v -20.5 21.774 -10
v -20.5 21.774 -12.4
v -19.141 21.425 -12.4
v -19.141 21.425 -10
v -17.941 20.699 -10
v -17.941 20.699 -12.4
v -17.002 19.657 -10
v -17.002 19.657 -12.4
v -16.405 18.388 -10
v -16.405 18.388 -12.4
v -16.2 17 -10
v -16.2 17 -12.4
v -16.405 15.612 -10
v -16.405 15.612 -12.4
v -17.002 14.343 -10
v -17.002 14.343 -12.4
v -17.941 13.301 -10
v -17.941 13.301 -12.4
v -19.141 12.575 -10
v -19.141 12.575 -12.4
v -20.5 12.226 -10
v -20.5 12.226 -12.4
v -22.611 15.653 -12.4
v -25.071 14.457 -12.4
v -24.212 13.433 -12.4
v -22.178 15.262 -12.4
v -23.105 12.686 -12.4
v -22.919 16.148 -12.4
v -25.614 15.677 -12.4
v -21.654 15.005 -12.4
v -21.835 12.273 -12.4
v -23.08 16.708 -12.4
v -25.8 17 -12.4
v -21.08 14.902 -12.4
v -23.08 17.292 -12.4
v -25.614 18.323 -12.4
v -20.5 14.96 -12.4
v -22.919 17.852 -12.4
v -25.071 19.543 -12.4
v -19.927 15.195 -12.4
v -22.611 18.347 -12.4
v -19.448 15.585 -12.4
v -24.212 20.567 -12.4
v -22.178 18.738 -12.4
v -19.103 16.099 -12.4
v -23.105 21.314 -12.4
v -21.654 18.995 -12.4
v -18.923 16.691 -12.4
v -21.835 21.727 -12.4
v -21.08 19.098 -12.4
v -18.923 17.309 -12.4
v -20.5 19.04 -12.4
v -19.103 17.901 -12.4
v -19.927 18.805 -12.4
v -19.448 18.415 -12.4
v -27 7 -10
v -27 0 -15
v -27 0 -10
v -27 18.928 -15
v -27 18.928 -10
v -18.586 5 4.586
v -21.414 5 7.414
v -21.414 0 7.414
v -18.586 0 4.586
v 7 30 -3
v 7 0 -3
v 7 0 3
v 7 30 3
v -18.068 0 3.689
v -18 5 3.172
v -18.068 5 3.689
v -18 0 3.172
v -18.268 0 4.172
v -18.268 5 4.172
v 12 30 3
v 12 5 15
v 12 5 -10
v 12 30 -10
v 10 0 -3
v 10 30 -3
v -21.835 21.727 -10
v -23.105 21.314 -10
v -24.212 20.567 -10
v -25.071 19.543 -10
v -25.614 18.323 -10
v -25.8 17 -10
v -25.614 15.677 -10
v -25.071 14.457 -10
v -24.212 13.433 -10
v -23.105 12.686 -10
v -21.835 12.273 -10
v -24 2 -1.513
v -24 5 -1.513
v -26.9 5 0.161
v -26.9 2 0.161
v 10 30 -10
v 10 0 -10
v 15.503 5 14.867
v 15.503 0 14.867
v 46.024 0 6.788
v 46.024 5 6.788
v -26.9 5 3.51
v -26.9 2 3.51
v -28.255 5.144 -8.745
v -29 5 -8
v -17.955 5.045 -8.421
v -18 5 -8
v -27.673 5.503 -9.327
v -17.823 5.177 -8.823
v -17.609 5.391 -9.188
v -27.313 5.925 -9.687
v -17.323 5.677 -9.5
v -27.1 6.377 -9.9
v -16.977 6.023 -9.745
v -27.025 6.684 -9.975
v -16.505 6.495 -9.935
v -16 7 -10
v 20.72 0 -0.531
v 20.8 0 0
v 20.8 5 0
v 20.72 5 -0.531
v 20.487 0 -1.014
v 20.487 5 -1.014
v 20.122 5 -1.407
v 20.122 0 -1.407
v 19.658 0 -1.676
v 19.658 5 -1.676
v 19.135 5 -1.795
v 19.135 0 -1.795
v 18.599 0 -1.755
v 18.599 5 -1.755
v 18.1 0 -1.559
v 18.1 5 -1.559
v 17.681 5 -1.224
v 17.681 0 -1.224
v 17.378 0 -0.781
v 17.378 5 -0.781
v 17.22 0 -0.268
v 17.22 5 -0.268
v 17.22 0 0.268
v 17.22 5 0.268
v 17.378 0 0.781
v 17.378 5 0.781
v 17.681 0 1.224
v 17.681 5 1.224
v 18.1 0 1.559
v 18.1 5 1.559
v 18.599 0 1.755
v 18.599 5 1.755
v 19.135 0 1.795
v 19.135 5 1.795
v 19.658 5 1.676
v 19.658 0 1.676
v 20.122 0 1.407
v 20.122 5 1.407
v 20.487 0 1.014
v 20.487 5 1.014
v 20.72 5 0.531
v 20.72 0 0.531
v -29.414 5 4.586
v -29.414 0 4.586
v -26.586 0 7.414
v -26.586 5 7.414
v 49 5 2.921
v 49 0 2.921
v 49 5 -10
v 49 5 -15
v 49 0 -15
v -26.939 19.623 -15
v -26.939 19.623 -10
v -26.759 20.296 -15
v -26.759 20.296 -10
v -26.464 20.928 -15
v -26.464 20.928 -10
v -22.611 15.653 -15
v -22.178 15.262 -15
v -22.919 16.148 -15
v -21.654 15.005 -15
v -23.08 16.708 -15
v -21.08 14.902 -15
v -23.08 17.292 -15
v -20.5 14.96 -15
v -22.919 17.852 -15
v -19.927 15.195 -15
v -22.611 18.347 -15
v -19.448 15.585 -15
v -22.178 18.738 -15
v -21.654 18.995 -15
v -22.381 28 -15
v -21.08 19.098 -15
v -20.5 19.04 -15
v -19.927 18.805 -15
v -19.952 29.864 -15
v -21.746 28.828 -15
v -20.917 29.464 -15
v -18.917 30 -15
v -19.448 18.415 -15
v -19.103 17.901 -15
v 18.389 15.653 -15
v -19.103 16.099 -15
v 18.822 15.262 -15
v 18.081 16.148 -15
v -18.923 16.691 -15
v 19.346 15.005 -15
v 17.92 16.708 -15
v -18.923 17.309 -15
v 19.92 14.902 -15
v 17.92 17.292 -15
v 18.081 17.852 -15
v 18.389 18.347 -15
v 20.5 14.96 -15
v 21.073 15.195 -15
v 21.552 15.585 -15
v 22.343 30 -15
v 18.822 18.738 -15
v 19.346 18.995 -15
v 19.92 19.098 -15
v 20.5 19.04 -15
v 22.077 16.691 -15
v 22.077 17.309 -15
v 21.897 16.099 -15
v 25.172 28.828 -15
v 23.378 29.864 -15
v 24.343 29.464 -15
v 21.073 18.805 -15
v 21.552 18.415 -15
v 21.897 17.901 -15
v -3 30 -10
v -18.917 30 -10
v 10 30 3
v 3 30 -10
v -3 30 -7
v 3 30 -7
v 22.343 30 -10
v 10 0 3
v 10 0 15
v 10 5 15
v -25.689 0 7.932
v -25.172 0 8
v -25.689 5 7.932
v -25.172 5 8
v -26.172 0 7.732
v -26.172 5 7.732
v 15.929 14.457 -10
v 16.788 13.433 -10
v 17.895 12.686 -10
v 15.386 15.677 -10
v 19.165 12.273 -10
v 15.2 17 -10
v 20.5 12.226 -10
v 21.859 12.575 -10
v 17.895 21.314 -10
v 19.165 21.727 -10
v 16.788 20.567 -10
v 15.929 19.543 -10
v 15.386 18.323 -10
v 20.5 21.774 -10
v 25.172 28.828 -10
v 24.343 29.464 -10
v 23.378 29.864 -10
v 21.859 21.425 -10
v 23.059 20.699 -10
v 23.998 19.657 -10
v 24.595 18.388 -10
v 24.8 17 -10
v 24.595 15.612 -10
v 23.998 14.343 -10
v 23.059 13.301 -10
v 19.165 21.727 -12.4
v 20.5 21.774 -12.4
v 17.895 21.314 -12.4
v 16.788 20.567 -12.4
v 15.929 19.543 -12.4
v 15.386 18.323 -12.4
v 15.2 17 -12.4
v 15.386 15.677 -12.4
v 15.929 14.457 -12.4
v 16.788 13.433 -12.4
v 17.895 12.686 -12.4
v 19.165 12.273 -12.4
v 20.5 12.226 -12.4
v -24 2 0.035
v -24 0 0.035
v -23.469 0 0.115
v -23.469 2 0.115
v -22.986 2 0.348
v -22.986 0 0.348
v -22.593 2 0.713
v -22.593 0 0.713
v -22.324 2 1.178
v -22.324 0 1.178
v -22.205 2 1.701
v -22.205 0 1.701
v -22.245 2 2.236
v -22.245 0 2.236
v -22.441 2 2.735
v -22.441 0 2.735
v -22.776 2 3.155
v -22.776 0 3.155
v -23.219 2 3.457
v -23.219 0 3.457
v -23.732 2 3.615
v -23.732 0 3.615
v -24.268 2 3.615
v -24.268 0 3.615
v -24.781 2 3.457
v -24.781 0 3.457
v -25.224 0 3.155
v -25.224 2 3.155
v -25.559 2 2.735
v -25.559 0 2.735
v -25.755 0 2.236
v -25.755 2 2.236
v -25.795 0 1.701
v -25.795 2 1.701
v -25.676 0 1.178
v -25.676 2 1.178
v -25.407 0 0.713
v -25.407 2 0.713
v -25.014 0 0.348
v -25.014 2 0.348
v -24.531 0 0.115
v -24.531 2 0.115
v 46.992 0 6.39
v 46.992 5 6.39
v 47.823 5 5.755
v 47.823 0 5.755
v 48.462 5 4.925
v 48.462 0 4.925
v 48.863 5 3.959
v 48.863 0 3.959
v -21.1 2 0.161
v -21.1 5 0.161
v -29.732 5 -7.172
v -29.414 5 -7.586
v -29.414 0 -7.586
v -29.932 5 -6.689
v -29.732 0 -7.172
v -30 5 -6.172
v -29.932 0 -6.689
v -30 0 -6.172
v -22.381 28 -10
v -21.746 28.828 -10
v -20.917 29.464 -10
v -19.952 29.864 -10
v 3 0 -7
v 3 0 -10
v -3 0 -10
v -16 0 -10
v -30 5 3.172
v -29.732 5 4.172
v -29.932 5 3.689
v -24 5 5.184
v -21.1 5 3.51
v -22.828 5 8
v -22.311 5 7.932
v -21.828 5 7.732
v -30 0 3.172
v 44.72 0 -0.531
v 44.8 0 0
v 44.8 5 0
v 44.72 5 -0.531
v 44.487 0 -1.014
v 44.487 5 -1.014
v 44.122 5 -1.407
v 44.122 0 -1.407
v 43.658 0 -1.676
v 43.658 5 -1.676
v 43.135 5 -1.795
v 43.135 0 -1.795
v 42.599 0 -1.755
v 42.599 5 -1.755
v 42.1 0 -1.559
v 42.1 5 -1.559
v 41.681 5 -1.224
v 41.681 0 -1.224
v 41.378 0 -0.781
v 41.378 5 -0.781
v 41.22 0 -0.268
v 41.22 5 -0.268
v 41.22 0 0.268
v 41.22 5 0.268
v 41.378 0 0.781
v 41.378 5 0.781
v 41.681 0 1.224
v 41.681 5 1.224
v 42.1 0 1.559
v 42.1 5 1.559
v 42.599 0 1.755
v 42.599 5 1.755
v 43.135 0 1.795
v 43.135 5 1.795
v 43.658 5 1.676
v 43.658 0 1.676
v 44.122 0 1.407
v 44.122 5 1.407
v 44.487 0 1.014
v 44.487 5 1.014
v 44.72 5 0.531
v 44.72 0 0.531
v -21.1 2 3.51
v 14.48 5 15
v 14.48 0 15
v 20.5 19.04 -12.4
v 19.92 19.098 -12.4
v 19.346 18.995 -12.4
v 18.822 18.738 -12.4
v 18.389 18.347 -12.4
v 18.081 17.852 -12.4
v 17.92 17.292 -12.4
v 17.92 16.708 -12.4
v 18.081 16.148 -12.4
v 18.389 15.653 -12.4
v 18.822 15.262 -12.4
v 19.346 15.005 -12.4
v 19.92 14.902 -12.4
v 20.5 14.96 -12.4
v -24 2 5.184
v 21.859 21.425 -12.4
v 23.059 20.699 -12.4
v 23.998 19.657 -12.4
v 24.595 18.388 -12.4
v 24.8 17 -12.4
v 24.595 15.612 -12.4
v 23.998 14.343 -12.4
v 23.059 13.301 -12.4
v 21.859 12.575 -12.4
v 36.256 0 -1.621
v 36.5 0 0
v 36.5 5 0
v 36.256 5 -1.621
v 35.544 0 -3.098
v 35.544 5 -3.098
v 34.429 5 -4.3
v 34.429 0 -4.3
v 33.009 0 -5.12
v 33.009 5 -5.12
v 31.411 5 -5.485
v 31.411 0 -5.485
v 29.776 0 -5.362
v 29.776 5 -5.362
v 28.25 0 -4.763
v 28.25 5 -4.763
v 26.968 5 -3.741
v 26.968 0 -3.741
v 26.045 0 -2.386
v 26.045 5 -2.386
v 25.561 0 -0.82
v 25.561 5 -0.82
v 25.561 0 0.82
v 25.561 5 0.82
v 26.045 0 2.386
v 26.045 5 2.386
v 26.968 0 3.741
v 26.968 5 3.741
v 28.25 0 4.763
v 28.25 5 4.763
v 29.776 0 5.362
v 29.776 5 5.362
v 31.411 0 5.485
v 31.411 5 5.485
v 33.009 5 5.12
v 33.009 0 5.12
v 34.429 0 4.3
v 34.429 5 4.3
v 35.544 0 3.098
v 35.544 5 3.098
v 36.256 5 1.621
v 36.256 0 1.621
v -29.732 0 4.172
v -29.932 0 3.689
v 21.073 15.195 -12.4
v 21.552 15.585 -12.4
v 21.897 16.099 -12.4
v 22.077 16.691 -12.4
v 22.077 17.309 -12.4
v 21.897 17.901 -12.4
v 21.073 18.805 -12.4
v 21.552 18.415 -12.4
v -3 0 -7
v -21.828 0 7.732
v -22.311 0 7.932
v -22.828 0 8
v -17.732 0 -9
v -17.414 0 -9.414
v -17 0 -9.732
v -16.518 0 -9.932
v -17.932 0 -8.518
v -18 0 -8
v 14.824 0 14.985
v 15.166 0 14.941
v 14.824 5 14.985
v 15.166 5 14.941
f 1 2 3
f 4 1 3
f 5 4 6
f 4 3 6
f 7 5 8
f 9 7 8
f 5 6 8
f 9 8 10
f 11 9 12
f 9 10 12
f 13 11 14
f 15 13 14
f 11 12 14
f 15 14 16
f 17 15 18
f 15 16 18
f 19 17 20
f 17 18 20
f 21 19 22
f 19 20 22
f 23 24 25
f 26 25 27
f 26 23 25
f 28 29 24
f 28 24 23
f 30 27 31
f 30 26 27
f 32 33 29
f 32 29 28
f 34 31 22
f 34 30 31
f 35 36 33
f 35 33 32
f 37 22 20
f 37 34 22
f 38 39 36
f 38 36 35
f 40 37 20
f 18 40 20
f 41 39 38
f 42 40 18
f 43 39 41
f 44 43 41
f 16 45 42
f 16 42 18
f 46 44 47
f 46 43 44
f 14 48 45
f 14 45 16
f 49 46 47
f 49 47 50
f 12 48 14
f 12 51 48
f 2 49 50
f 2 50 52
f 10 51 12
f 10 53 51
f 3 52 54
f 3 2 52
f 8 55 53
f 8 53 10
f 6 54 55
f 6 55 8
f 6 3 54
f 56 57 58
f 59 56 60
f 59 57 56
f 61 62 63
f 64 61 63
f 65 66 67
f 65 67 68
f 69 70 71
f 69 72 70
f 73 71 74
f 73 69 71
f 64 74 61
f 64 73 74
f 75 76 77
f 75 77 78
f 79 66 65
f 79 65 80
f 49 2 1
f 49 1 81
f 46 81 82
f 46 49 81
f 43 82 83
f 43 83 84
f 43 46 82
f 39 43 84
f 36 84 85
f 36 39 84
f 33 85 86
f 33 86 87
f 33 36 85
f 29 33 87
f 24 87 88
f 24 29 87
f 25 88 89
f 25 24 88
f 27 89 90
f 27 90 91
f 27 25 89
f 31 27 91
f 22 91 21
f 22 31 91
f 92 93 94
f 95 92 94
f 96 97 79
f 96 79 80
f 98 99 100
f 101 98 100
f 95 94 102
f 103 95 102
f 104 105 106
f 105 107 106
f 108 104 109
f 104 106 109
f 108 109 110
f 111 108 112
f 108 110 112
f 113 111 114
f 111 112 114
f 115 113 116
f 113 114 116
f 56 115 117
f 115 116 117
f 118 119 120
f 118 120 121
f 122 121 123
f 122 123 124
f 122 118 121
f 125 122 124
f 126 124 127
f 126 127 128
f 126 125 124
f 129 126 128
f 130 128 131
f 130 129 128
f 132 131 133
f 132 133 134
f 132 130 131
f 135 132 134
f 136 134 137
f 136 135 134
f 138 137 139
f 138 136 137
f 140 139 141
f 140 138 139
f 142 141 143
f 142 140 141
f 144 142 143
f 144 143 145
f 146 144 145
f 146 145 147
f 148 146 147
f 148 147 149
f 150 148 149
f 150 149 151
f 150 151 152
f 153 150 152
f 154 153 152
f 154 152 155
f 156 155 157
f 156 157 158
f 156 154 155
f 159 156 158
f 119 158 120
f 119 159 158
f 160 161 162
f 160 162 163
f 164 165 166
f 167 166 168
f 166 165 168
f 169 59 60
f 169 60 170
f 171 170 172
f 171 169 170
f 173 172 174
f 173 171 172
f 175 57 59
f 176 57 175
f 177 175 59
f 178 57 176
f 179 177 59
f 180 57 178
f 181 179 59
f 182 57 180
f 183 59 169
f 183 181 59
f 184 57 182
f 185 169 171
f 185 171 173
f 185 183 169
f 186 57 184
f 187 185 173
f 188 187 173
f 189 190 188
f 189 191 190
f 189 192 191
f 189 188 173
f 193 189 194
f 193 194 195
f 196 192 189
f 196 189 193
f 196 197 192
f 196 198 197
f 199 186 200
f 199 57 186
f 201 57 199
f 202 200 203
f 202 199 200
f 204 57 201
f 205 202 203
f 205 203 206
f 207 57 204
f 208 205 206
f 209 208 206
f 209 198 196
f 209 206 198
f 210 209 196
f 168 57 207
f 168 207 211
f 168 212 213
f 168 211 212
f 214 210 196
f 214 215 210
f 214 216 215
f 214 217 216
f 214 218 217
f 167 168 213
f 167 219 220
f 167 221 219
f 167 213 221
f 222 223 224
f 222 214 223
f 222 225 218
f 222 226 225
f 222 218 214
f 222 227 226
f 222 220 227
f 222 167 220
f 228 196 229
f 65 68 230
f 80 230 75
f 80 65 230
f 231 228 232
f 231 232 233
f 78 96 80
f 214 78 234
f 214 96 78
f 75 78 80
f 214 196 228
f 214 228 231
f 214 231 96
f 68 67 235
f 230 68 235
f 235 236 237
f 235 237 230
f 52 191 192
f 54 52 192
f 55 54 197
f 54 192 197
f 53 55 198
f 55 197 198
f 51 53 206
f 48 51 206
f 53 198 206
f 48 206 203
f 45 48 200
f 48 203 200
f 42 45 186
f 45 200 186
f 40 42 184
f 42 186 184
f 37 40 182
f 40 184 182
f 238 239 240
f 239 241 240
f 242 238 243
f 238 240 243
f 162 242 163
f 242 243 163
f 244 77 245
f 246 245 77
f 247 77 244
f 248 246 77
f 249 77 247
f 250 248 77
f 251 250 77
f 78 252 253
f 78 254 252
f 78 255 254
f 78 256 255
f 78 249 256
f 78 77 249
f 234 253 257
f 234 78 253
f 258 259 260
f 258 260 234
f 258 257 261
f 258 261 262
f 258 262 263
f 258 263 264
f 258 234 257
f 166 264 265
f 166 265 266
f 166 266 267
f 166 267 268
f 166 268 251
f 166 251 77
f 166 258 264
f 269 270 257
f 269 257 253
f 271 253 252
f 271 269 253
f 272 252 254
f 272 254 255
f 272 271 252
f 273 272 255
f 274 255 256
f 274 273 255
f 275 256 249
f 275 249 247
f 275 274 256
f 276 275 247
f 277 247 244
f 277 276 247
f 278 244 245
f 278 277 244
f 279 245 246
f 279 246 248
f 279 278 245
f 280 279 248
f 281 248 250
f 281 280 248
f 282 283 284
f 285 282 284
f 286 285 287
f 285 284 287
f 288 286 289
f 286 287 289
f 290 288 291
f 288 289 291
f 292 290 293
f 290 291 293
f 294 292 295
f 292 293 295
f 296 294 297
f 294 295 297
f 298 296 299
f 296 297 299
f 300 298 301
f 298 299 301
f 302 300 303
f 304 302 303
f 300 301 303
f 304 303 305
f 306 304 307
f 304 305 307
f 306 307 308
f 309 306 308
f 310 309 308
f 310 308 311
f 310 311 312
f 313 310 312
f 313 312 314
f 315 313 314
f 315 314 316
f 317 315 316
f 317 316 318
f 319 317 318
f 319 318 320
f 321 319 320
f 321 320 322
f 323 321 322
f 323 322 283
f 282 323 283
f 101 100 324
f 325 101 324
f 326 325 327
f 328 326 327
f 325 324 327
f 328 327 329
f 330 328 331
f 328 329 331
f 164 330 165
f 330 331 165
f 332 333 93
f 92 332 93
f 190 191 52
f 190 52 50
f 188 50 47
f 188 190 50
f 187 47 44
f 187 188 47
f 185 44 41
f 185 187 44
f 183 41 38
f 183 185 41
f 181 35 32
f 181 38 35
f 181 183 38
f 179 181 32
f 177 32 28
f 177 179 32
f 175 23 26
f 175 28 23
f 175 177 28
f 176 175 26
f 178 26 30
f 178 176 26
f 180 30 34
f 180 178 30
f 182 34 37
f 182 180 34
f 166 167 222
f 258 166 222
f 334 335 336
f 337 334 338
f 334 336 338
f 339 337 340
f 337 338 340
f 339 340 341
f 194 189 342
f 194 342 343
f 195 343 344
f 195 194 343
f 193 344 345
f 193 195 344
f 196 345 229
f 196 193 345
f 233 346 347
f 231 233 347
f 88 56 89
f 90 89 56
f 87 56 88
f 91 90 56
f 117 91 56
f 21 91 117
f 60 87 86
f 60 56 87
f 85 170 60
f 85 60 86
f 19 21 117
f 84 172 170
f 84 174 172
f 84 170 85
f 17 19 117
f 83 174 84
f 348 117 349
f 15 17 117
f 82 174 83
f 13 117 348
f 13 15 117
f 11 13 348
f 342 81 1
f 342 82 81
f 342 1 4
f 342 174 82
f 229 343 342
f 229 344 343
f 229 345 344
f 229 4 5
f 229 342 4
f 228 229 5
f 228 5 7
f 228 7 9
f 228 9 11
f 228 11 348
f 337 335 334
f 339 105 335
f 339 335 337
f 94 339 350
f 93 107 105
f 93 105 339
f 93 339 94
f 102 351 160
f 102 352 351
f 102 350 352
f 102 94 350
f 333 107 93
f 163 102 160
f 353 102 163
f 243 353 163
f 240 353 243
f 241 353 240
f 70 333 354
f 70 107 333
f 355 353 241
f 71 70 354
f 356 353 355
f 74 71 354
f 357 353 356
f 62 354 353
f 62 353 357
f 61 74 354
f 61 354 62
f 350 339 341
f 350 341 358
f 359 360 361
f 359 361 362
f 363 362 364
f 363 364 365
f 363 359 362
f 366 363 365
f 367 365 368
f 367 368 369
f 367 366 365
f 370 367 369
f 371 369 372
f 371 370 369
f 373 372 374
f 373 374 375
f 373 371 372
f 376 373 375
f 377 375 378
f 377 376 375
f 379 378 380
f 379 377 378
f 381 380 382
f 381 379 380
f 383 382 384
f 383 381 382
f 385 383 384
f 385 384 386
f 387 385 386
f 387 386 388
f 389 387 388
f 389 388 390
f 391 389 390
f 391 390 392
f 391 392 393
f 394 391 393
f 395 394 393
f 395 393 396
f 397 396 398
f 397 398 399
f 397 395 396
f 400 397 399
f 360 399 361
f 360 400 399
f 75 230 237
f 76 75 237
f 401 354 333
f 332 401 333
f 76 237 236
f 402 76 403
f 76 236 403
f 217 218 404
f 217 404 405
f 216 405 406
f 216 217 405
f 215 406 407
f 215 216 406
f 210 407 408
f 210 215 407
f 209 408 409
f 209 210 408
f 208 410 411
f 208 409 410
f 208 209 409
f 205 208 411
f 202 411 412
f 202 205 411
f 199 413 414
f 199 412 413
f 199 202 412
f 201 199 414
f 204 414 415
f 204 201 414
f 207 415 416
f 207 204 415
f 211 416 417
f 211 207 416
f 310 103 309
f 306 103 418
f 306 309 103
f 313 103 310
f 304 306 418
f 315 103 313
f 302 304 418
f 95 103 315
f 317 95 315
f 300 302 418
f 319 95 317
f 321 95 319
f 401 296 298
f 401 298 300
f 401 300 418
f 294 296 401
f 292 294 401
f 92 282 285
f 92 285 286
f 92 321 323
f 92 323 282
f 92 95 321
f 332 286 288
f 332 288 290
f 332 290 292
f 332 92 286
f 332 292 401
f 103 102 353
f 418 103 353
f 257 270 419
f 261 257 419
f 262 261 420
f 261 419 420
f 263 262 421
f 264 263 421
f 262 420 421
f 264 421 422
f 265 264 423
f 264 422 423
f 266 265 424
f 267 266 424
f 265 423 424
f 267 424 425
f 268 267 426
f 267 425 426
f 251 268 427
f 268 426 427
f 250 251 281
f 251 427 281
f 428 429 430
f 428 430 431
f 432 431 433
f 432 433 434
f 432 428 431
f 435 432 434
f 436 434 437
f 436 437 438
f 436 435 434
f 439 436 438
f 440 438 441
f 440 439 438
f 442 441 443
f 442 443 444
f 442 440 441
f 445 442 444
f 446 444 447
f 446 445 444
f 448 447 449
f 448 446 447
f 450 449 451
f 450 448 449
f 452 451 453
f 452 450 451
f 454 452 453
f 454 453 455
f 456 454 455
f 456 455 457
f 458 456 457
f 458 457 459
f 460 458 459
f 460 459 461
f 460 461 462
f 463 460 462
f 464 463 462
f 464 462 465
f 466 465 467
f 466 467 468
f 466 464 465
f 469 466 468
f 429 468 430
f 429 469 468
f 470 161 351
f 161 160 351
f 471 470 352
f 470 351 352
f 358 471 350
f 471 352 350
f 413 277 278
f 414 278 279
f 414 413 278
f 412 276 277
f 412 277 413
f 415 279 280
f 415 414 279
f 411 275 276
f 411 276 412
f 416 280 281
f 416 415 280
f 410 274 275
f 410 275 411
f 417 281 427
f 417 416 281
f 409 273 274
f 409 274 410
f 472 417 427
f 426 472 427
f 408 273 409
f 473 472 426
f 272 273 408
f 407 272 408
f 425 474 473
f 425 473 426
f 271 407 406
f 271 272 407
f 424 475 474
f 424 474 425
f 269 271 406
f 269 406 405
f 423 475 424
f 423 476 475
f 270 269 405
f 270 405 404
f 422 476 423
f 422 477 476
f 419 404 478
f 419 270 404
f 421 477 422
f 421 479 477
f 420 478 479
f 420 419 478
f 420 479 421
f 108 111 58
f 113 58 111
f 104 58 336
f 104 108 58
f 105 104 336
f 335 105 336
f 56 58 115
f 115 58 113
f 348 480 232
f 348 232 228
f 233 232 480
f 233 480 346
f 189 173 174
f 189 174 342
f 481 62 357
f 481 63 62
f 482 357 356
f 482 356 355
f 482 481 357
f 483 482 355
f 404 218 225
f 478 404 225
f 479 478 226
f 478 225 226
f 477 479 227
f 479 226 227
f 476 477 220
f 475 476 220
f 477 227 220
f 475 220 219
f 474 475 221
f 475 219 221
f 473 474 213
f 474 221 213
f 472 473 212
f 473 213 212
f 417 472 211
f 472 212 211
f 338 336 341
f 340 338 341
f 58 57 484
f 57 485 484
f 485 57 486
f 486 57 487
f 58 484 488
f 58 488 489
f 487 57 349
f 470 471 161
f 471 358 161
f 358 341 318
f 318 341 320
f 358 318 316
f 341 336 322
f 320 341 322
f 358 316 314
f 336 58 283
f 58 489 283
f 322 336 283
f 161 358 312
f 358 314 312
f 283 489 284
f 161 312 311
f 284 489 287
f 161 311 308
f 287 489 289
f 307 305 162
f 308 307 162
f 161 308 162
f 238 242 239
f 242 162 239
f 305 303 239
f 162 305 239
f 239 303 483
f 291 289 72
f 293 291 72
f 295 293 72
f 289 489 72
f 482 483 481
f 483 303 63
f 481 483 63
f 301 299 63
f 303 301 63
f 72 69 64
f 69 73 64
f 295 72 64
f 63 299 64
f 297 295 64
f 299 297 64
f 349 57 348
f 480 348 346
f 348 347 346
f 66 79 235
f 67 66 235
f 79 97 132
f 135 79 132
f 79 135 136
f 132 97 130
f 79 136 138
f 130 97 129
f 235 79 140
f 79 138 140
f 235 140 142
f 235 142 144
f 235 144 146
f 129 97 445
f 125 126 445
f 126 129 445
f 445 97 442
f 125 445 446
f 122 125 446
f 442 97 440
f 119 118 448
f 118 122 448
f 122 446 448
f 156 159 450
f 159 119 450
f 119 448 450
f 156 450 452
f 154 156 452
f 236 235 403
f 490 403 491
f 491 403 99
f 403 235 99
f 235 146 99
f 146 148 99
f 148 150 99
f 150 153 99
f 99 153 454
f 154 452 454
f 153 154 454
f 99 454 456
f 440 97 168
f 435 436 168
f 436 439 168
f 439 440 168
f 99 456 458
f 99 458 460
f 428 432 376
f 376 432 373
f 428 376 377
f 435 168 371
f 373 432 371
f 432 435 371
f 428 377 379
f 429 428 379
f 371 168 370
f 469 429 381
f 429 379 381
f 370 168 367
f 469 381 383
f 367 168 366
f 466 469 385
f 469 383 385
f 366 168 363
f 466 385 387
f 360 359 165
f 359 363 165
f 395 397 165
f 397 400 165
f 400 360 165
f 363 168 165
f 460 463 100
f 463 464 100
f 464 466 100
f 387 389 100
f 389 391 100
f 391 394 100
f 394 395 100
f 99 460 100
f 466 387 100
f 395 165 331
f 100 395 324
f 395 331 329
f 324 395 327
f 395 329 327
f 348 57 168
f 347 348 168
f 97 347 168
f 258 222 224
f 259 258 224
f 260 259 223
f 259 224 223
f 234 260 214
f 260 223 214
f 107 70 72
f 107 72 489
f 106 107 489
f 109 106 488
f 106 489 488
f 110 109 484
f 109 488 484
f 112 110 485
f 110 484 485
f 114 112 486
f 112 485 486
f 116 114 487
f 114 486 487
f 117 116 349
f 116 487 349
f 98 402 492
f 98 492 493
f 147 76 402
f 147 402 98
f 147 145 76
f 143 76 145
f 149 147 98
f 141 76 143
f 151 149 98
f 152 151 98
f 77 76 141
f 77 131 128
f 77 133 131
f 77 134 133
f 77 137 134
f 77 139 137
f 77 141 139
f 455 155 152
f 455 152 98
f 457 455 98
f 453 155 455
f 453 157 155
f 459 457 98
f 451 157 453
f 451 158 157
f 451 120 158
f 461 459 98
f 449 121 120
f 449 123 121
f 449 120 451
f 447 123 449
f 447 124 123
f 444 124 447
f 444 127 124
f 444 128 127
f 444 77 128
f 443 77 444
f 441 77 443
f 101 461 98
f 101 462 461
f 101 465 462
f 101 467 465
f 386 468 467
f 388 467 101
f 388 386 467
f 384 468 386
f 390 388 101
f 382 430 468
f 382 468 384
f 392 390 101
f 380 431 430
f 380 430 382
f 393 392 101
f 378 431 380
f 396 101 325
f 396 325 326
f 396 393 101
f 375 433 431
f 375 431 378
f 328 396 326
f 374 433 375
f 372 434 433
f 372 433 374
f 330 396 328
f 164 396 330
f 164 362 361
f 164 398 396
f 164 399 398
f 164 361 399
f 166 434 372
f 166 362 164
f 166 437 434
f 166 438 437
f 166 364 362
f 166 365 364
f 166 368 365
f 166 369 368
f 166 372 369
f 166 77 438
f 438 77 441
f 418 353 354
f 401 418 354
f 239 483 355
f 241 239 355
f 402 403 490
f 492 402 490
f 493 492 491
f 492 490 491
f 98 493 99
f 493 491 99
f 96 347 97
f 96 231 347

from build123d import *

# Parameters (mm, degrees)
SKETCH1_W                     = 30
SKETCH1_H                     = 30
BOSS_EXTRUDE1_DEPTH           = 30
SKETCH2_W                     = 20
SKETCH2_H                     = 20
CUT_EXTRUDE1_DEPTH            = 37.742346142
SKETCH3_W                     = 30
SKETCH3_H                     = 5
BOSS_EXTRUDE2_DEPTH           = 40
SKETCH4_R                     = 5.5
SKETCH4_R_2                   = 1.8
CUT_EXTRUDE2_DEPTH            = 65.420493634
CUT_EXTRUDE3_DEPTH            = 63.24949799
SKETCH5_W                     = 5
SKETCH5_H                     = 25
BOSS_EXTRUDE4_DEPTH           = 34
CHAMFER1_SIZE                 = 25
SKETCH8_R                     = 2.1
CUT_EXTRUDE4_DEPTH            = 63.657800791
SKETCH9_W                     = 5
SKETCH9_H                     = 30
BOSS_EXTRUDE5_DEPTH           = 12
CHAMFER2_SIZE                 = 10
CHAMFER2_SIZE2                = 5.773502692
SKETCH10_R                    = 2.1
CUT_EXTRUDE5_DEPTH            = 63.657800791
BODY_MOVE_COPY1_OUTLINE_R     = 1.8
BODY_MOVE_COPY1_OUTLINE_R_2   = 5.5
BODY_MOVE_COPY1_DEPTH         = 27.5685
BODY_MOVE_COPY1_2_OUTLINE_R   = 1.8
BODY_MOVE_COPY1_2_OUTLINE_R_2 = 5.5
BODY_MOVE_COPY1_2_DEPTH       = 5
BODY_MOVE_COPY1_START         = -15
BODY_MOVE_COPY1_3_DEPTH       = 5
BODY_MOVE_COPY1_4_DEPTH       = 5
SKETCH11_W                    = 3
SKETCH11_H                    = 25
CUT_EXTRUDE6_DEPTH            = 25
SKETCH12_W                    = 25
SKETCH12_H                    = 25
CUT_EXTRUDE7_DEPTH            = 60.380131357
SKETCH13_W                    = 3
SKETCH13_H                    = 6
SKETCH13_W_2                  = 6
SKETCH13_H_2                  = 3
BOSS_EXTRUDE6_DEPTH           = 30
SKETCH14_R                    = 4.8
CUT_EXTRUDE9_DEPTH            = 2.4
CHAMFER3_SIZE                 = 12
CHAMFER3_SIZE2                = 25
FILLET1_R                     = 4
FILLET2_R                     = 4
BODY_MOVE_COPY2_OUTLINE_R     = 1.8
BODY_MOVE_COPY2_OUTLINE_R_2   = 5.5
BODY_MOVE_COPY2_DEPTH         = 30
BODY_MOVE_COPY2_2_OUTLINE_R   = 1.8
BODY_MOVE_COPY2_2_OUTLINE_R_2 = 5.5
BODY_MOVE_COPY2_2_DEPTH       = 5
BODY_MOVE_COPY2_START         = -15
BODY_MOVE_COPY2_3_DEPTH       = 5
BODY_MOVE_COPY2_START_2       = -3
BODY_MOVE_COPY2_4_OUTLINE_W   = 5
BODY_MOVE_COPY2_4_OUTLINE_H   = 25
BODY_MOVE_COPY2_4_DEPTH       = 6
BODY_MOVE_COPY2_START_3       = -10
BODY_MOVE_COPY2_5_OUTLINE_W   = 2
BODY_MOVE_COPY2_5_OUTLINE_H   = 25
BODY_MOVE_COPY2_5_DEPTH       = 13
BODY_MOVE_COPY2_6_DEPTH       = 2.6
BODY_MOVE_COPY2_START_4       = 10
BODY_MOVE_COPY2_7_DEPTH       = 2
BODY_MOVE_COPY2_START_5       = 7
BODY_MOVE_COPY2_8_OUTLINE_W   = 25
BODY_MOVE_COPY2_8_OUTLINE_H   = 6
BODY_MOVE_COPY2_8_DEPTH       = 3.26576
BODY_MOVE_COPY2_START_6       = -16
BODY_MOVE_COPY2_9_DEPTH       = 6
BODY_MOVE_COPY2_START_7       = -12.4
BODY_MOVE_COPY2_10_DEPTH      = 2.4
SKETCH15_W                    = 13
SKETCH15_H                    = 5
BOSS_EXTRUDE7_DEPTH           = 18
SKETCH17_W                    = 23
SKETCH17_H                    = 5
BOSS_EXTRUDE8_DEPTH           = 3
SKETCH18_W                    = 4
SKETCH18_H                    = 18
CUT_EXTRUDE10_DEPTH           = 58.017541161
CHAMFER6_SIZE                 = 4
FILLET4_R                     = 2
SKETCH16_R                    = 1.8
CUT_EXTRUDE11_DEPTH           = 60.380131357
CUT_EXTRUDE12_DEPTH           = 3


with BuildPart() as part:
    # Sketch1 → Boss-Extrude1 (new body)
    with BuildSketch(Plane(origin=(0, 0, 0), x_dir=(1, 0, 0), z_dir=(0, 1, 0))):
        Rectangle(SKETCH1_W, SKETCH1_H)
    extrude(amount=BOSS_EXTRUDE1_DEPTH)

    # Sketch2 → Cut-Extrude1 (cut, through all)
    with BuildSketch(Plane(origin=(0, 30, 0), x_dir=(1, 0, 0), z_dir=(0, 1, 0))):
        Rectangle(SKETCH2_W, SKETCH2_H)
    extrude(amount=-CUT_EXTRUDE1_DEPTH, mode=Mode.SUBTRACT)

    # Sketch3 → Boss-Extrude2 (add)
    with BuildSketch(Plane(origin=(15, 0, 0), x_dir=(0, 0, -1), z_dir=(1, 0, 0))):
        with Locations((0, 2.5)):
            Rectangle(SKETCH3_W, SKETCH3_H)
    extrude(amount=BOSS_EXTRUDE2_DEPTH)

    # Sketch4 → Cut-Extrude2 (cut, through all)
    with BuildSketch(Plane.XZ):
        with Locations(Location((31, 0, 0), (0, 0, 270))):
            Circle(SKETCH4_R)
        with Locations(Location((19, 0, 0), (0, 0, 270))):
            Circle(SKETCH4_R_2)
        with Locations(Location((43, 0, 0), (0, 0, 270))):
            Circle(SKETCH4_R_2)
    extrude(amount=-CUT_EXTRUDE2_DEPTH, mode=Mode.SUBTRACT)

    # Sketch7 → Cut-Extrude3 (cut, through all)
    with BuildSketch(Plane(origin=(0, 5, 0), x_dir=(1, 0, 0), z_dir=(0, 1, 0))):
        Polygon((15, -15), (49, -6), (49, 15), (55, 15), (55, -15), align=None)
    extrude(amount=-CUT_EXTRUDE3_DEPTH, mode=Mode.SUBTRACT)

    # Sketch5 → Boss-Extrude4 (add)
    with BuildSketch(Plane(origin=(15, 0, 0), x_dir=(0, 0, -1), z_dir=(1, 0, 0))):
        with Locations((12.5, 17.5)):
            Rectangle(SKETCH5_W, SKETCH5_H)
    extrude(amount=BOSS_EXTRUDE4_DEPTH)

    # Chamfer1
    chamfer1_edges = [part.edges().sort_by_distance(p)[0] for p in [
        (49, 30, -12.5),
    ]]
    chamfer(chamfer1_edges, length=CHAMFER1_SIZE)

    # Sketch8 → Cut-Extrude4 (cut, through all)
    with BuildSketch(Plane.XY.offset(-10)):
        with Locations((20, 17)):
            Circle(SKETCH8_R)
    extrude(amount=-CUT_EXTRUDE4_DEPTH, mode=Mode.SUBTRACT)

    # Sketch9 → Boss-Extrude5 (add)
    with BuildSketch(Plane.ZY.offset(15)):
        with Locations((-12.5, 15)):
            Rectangle(SKETCH9_W, SKETCH9_H)
    extrude(amount=BOSS_EXTRUDE5_DEPTH)

    # Chamfer2
    chamfer2_edges = [part.edges().sort_by_distance(p)[0] for p in [
        (-27, 30, -12.5),
    ]]
    chamfer2_side = [part.faces().sort_by_distance(p)[0] for p in [
        (-27, 15, -12.5),
    ]]
    chamfer(chamfer2_edges, length=CHAMFER2_SIZE, length2=CHAMFER2_SIZE2, reference=chamfer2_side[0])

    # Sketch10 → Cut-Extrude5 (cut, through all)
    with BuildSketch(Plane.XY.offset(-10)):
        with Locations((-21, 17)):
            Circle(SKETCH10_R)
    extrude(amount=-CUT_EXTRUDE5_DEPTH, mode=Mode.SUBTRACT)

    # Body-Move/Copy1: read off the stored shape, not the designer's step
    # Body-Move/Copy1 outline → Body-Move/Copy1 (cut)
    with BuildSketch(Plane(origin=(0, 0, 0), x_dir=(1, 0, 0), z_dir=(0, 1, 0))):
        Polygon((27, 10), (15, 10), (15, -15), (49, -6), (49, 15), (27, 15), align=None)
        with Locations((19, 0)):
            Circle(BODY_MOVE_COPY1_OUTLINE_R, mode=Mode.SUBTRACT)
        with Locations((31, 0)):
            Circle(BODY_MOVE_COPY1_OUTLINE_R_2, mode=Mode.SUBTRACT)
        with Locations((43, 0)):
            Circle(BODY_MOVE_COPY1_OUTLINE_R, mode=Mode.SUBTRACT)
    extrude(amount=BODY_MOVE_COPY1_DEPTH, mode=Mode.SUBTRACT)

    # Body-Move_Copy1 2 outline → Body-Move_Copy1 2 (add)
    with BuildSketch(Plane(origin=(0, 0, 0), x_dir=(1, 0, 0), z_dir=(0, 1, 0))):
        Polygon((-27, 10), (-27, 15), (-49, 15), (-49, -6), (-15, -15), (-15, 10), align=None)
        with Locations((-19, 0)):
            Circle(BODY_MOVE_COPY1_2_OUTLINE_R, mode=Mode.SUBTRACT)
        with Locations((-43, 0)):
            Circle(BODY_MOVE_COPY1_2_OUTLINE_R, mode=Mode.SUBTRACT)
        with Locations((-31, 0)):
            Circle(BODY_MOVE_COPY1_2_OUTLINE_R_2, mode=Mode.SUBTRACT)
    extrude(amount=BODY_MOVE_COPY1_2_DEPTH)

    # Body-Move_Copy1 3 outline → Body-Move_Copy1 3 (cut)
    with BuildSketch(Plane.XY.offset(BODY_MOVE_COPY1_START)):
        Polygon((24, 30), (21.226497308, 30), (27, 20), (27, 27), align=None)
        with BuildLine():
            ThreePointArc((-20.5, 14.960392195), (-17.9, 17), (-20.5, 19.039607805))
            ThreePointArc((-20.5, 19.039607805), (-18.9, 17), (-20.5, 14.960392195))
        make_face()
        with BuildLine():
            ThreePointArc((20.5, 14.960392195), (23.1, 17), (20.5, 19.039607805))
            ThreePointArc((20.5, 19.039607805), (22.1, 17), (20.5, 14.960392195))
        make_face()
    extrude(amount=BODY_MOVE_COPY1_3_DEPTH, mode=Mode.SUBTRACT)

    # Body-Move_Copy1 4 outline → Body-Move_Copy1 4 (add)
    with BuildSketch(Plane.XY.offset(BODY_MOVE_COPY1_START)):
        Polygon((-27, 20), (-21.226497308, 30), (-24, 30), (-49, 5), (-27, 5), align=None)
        with BuildLine():
            ThreePointArc((-20.5, 14.960392195), (-22.1, 17), (-20.5, 19.039607805))
            ThreePointArc((-20.5, 19.039607805), (-23.1, 17), (-20.5, 14.960392195))
        make_face()
        with BuildLine():
            ThreePointArc((20.5, 14.960392195), (18.9, 17), (20.5, 19.039607805))
            ThreePointArc((20.5, 19.039607805), (17.9, 17), (20.5, 14.960392195))
        make_face()
    extrude(amount=BODY_MOVE_COPY1_4_DEPTH)

    # Sketch11 → Cut-Extrude6 (cut)
    with BuildSketch(Plane(origin=(0, 30, 0), x_dir=(1, 0, 0), z_dir=(0, 1, 0))):
        with Locations((-13.5, -2.5)):
            Rectangle(SKETCH11_W, SKETCH11_H)
    extrude(amount=-CUT_EXTRUDE6_DEPTH, mode=Mode.SUBTRACT)

    # Sketch12 → Cut-Extrude7 (cut, through all)
    with BuildSketch(Plane(origin=(0, 30, 0), x_dir=(1, 0, 0), z_dir=(0, 1, 0))):
        with Locations((2.5, -2.5)):
            Rectangle(SKETCH12_W, SKETCH12_H)
    extrude(amount=-CUT_EXTRUDE7_DEPTH, mode=Mode.SUBTRACT)

    # Sketch13 → Boss-Extrude6 (add)
    with BuildSketch(Plane(origin=(0, 30, 0), x_dir=(1, 0, 0), z_dir=(0, 1, 0))):
        with Locations((-8.5, 0)):
            Rectangle(SKETCH13_W, SKETCH13_H)
        with Locations((0, 8.5)):
            Rectangle(SKETCH13_W_2, SKETCH13_H_2)
    extrude(amount=-BOSS_EXTRUDE6_DEPTH)

    # Sketch14 → Cut-Extrude9 (cut)
    with BuildSketch(Plane.XY.offset(-10)):
        with Locations((-20, 17)):
            Circle(SKETCH14_R)
        with Locations((21, 17)):
            Circle(SKETCH14_R)
    extrude(amount=-CUT_EXTRUDE9_DEPTH, mode=Mode.SUBTRACT)

    # Chamfer3
    chamfer3_edges = [part.edges().sort_by_distance(p)[0] for p in [
        (-11, 30, 15),
    ]]
    chamfer3_side = [part.faces().sort_by_distance(p)[0] for p in [
        (-18, 30, -10.542718717),
    ]]
    chamfer(chamfer3_edges, length=CHAMFER3_SIZE, length2=CHAMFER3_SIZE2, reference=chamfer3_side[0])

    # Fillet1
    fillet1_edges = [part.edges().sort_by_distance(p)[0] for p in [
        (-15, 2.5, 15),
        (-49, 2.5, 6),
    ]]
    fillet(fillet1_edges, radius=FILLET1_R)

    # Fillet2
    fillet2_edges = [part.edges().sort_by_distance(p)[0] for p in [
        (27, 20, -12.5),
        (21.226497308, 30, -12.5),
        (-24, 30, -12.5),
    ]]
    fillet(fillet2_edges, radius=FILLET2_R)

    # Body-Move/Copy2: read off the stored shape, not the designer's step
    # Body-Move/Copy2 outline → Body-Move/Copy2 (cut)
    with BuildSketch(Plane(origin=(0, 0, 0), x_dir=(1, 0, 0), z_dir=(0, 1, 0))):
        with BuildLine():
            Line((-10, 3), (-10, 10))
            Line((-10, 10), (-27, 10))
            Line((-27, 10), (-27, 15))
            Line((-27, 15), (-49, 15))
            Line((-49, 15), (-49, -2.921057554))
            ThreePointArc((-49, -2.921057554), (-48.169722461, -5.360905811), (-46.023570241, -6.787878466))
            Line((-46.023570241, -6.787878466), (-15.503121001, -14.866820911))
            ThreePointArc((-15.503121001, -14.866820911), (-14.995649759, -14.966565495), (-14.47955076, -15))
            Line((-14.47955076, -15), (-10, -15))
            Line((-10, -15), (-10, -3))
            Line((-10, -3), (-7, -3))
            Line((-7, -3), (-7, 3))
            Line((-7, 3), (-10, 3))
        make_face()
        with Locations((-19, 0)):
            Circle(BODY_MOVE_COPY2_OUTLINE_R, mode=Mode.SUBTRACT)
        with Locations((-43, 0)):
            Circle(BODY_MOVE_COPY2_OUTLINE_R, mode=Mode.SUBTRACT)
        with Locations((-31, 0)):
            Circle(BODY_MOVE_COPY2_OUTLINE_R_2, mode=Mode.SUBTRACT)
    extrude(amount=BODY_MOVE_COPY2_DEPTH, mode=Mode.SUBTRACT)

    # Body-Move_Copy2 2 outline → Body-Move_Copy2 2 (add)
    with BuildSketch(Plane(origin=(0, 0, 0), x_dir=(1, 0, 0), z_dir=(0, 1, 0))):
        with BuildLine():
            Line((49, 15), (27, 15))
            Line((27, 15), (27, 10))
            Line((27, 10), (10, 10))
            Line((10, 10), (10, 3))
            Line((10, 3), (7, 3))
            Line((7, 3), (7, -3))
            Line((7, -3), (10, -3))
            Line((10, -3), (10, -15))
            Line((10, -15), (14.47955076, -15))
            ThreePointArc((14.47955076, -15), (14.995649759, -14.966565495), (15.503121001, -14.866820911))
            Line((15.503121001, -14.866820911), (46.023570241, -6.787878466))
            ThreePointArc((46.023570241, -6.787878466), (48.169722461, -5.360905811), (49, -2.921057554))
            Line((49, -2.921057554), (49, 15))
        make_face()
        with Locations((43, 0)):
            Circle(BODY_MOVE_COPY2_2_OUTLINE_R, mode=Mode.SUBTRACT)
        with Locations((19, 0)):
            Circle(BODY_MOVE_COPY2_2_OUTLINE_R, mode=Mode.SUBTRACT)
        with Locations((31, 0)):
            Circle(BODY_MOVE_COPY2_2_OUTLINE_R_2, mode=Mode.SUBTRACT)
    extrude(amount=BODY_MOVE_COPY2_2_DEPTH)

    # Body-Move_Copy2 3 outline → Body-Move_Copy2 3 (add)
    with BuildSketch(Plane.XY.offset(BODY_MOVE_COPY2_START)):
        with BuildLine():
            Line((27, 5), (49, 5))
            Line((49, 5), (25.171572875, 28.828427125))
            ThreePointArc((25.171572875, 28.828427125), (23.87387948, 29.69551813), (22.343145751, 30))
            Line((22.343145751, 30), (18.917096231, 30))
            ThreePointArc((18.917096231, 30), (20.917096231, 29.464101615), (22.381197846, 28))
            Line((22.381197846, 28), (26.464101615, 20.92820323))
            ThreePointArc((26.464101615, 20.92820323), (26.863703305, 19.96347941), (27, 18.92820323))
            Line((27, 18.92820323), (27, 5))
        make_face()
        with BuildLine():
            ThreePointArc((20.5, 21.773887305), (24.8, 17), (20.5, 12.226112695))
            ThreePointArc((20.5, 12.226112695), (25.8, 17), (20.5, 21.773887305))
        make_face()
        with BuildLine():
            ThreePointArc((-20.5, 21.773887305), (-16.2, 17), (-20.5, 12.226112695))
            ThreePointArc((-20.5, 12.226112695), (-15.2, 17), (-20.5, 21.773887305))
        make_face()
    extrude(amount=BODY_MOVE_COPY2_3_DEPTH)

    # Body-Move_Copy2 4 outline → Body-Move_Copy2 4 (add)
    with BuildSketch(Plane.XY.offset(BODY_MOVE_COPY2_START_2)):
        with Locations((9.5, 17.5)):
            Rectangle(BODY_MOVE_COPY2_4_OUTLINE_W, BODY_MOVE_COPY2_4_OUTLINE_H)
    extrude(amount=BODY_MOVE_COPY2_4_DEPTH)

    # Body-Move_Copy2 5 outline → Body-Move_Copy2 5 (add)
    with BuildSketch(Plane.XY.offset(BODY_MOVE_COPY2_START_3)):
        with Locations((11, 17.5)):
            Rectangle(BODY_MOVE_COPY2_5_OUTLINE_W, BODY_MOVE_COPY2_5_OUTLINE_H)
    extrude(amount=BODY_MOVE_COPY2_5_DEPTH)

    # Body-Move_Copy2 6 outline → Body-Move_Copy2 6 (add)
    with BuildSketch(Plane.XY.offset(BODY_MOVE_COPY2_START)):
        with BuildLine():
            ThreePointArc((-20.5, 19.039607805), (-18.9, 17), (-20.5, 14.960392195))
            ThreePointArc((-20.5, 14.960392195), (-17.9, 17), (-20.5, 19.039607805))
        make_face()
        with BuildLine():
            ThreePointArc((20.5, 19.039607805), (22.1, 17), (20.5, 14.960392195))
            ThreePointArc((20.5, 14.960392195), (23.1, 17), (20.5, 19.039607805))
        make_face()
    extrude(amount=BODY_MOVE_COPY2_6_DEPTH)

    # Body-Move_Copy2 7 outline → Body-Move_Copy2 7 (add)
    with BuildSketch(Plane.YZ.offset(BODY_MOVE_COPY2_START_4)):
        Polygon((5, 15), (5, -10), (30, -10), (30, 3), align=None)
    extrude(amount=BODY_MOVE_COPY2_7_DEPTH)

    # Body-Move_Copy2 8 outline → Body-Move_Copy2 8 (add)
    with BuildSketch(Plane.YZ.offset(BODY_MOVE_COPY2_START_5)):
        with Locations((17.5, 0)):
            Rectangle(BODY_MOVE_COPY2_8_OUTLINE_W, BODY_MOVE_COPY2_8_OUTLINE_H)
    extrude(amount=BODY_MOVE_COPY2_8_DEPTH)

    # Body-Move_Copy2 9 outline → Body-Move_Copy2 9 (cut)
    with BuildSketch(Plane.XY.offset(BODY_MOVE_COPY2_START_6)):
        with BuildLine():
            ThreePointArc((-20.5, 14.960392195), (-22.1, 17), (-20.5, 19.039607805))
            ThreePointArc((-20.5, 19.039607805), (-23.1, 17), (-20.5, 14.960392195))
        make_face()
        with BuildLine():
            ThreePointArc((20.5, 14.960392195), (18.9, 17), (20.5, 19.039607805))
            ThreePointArc((20.5, 19.039607805), (17.9, 17), (20.5, 14.960392195))
        make_face()
        with BuildLine():
            ThreePointArc((-22.381197846, 28), (-20.917096231, 29.464101615), (-18.917096231, 30))
            Line((-18.917096231, 30), (-22.343145751, 30))
            ThreePointArc((-22.343145751, 30), (-23.87387948, 29.69551813), (-25.171572875, 28.828427125))
            Line((-25.171572875, 28.828427125), (-27, 27))
            Line((-27, 27), (-27, 18.92820323))
            ThreePointArc((-27, 18.92820323), (-26.863703305, 19.96347941), (-26.464101615, 20.92820323))
            Line((-26.464101615, 20.92820323), (-22.381197846, 28))
        make_face()
    extrude(amount=BODY_MOVE_COPY2_9_DEPTH, mode=Mode.SUBTRACT)

    # Body-Move_Copy2 10 outline → Body-Move_Copy2 10 (cut)
    with BuildSketch(Plane.XY.offset(BODY_MOVE_COPY2_START_7)):
        with BuildLine():
            ThreePointArc((20.5, 12.226112695), (16.2, 17), (20.5, 21.773887305))
            ThreePointArc((20.5, 21.773887305), (15.2, 17), (20.5, 12.226112695))
        make_face()
        with BuildLine():
            ThreePointArc((-20.5, 12.226112695), (-24.8, 17), (-20.5, 21.773887305))
            ThreePointArc((-20.5, 21.773887305), (-25.8, 17), (-20.5, 12.226112695))
        make_face()
    extrude(amount=BODY_MOVE_COPY2_10_DEPTH, mode=Mode.SUBTRACT)

    # Sketch15 → Boss-Extrude7 (add)
    with BuildSketch(Plane.XY.offset(-10)):
        with Locations((-20.5, 2.5)):
            Rectangle(SKETCH15_W, SKETCH15_H)
    extrude(amount=BOSS_EXTRUDE7_DEPTH)

    # Sketch17 → Boss-Extrude8 (add)
    with BuildSketch(Plane.ZY.offset(27)):
        with Locations((-3.5, 2.5)):
            Rectangle(SKETCH17_W, SKETCH17_H)
    extrude(amount=BOSS_EXTRUDE8_DEPTH)

    # Sketch18 → Cut-Extrude10 (cut, through all)
    with BuildSketch(Plane(origin=(0, 5, 0), x_dir=(1, 0, 0), z_dir=(0, 1, 0))):
        Polygon((-27, 10), (-30, 7), (-30, 15), (-27, 15), align=None)
        with Locations((-16, 1)):
            Rectangle(SKETCH18_W, SKETCH18_H)
    extrude(amount=-CUT_EXTRUDE10_DEPTH, mode=Mode.SUBTRACT)

    # Chamfer6
    chamfer6_edges = [part.edges().sort_by_distance(p)[0] for p in [
        (-30, 2.5, 8),
        (-18, 2.5, 8),
    ]]
    chamfer(chamfer6_edges, length=CHAMFER6_SIZE)

    # Fillet4
    fillet4_edges = [part.edges().sort_by_distance(p)[0] for p in [
        (-30, 2.5, -7),
        (-22.5, 5, -10),
        (-18, 2.5, -10),
        (-26, 2.5, 8),
        (-22, 2.5, 8),
        (-18, 2.5, 4),
        (-30, 2.5, 4),
    ]]
    fillet(fillet4_edges, radius=FILLET4_R)

    # Sketch16 → Cut-Extrude11 (cut, through all)
    with BuildSketch(Plane.XZ):
        with Locations(Location((-24, 1.835210164, 0), (0, 0, 270))):
            Circle(SKETCH16_R)
    extrude(amount=-CUT_EXTRUDE11_DEPTH, mode=Mode.SUBTRACT)

    # Sketch19 → Cut-Extrude12 (cut)
    with BuildSketch(Plane(origin=(0, 5, 0), x_dir=(1, 0, 0), z_dir=(0, 1, 0))):
        Polygon((-21.1, -0.160894384), (-24, 1.513421397), (-26.9, -0.160894384), (-26.9, -3.509525945), (-24, -5.183841726), (-21.1, -3.509525945), align=None)
    extrude(amount=-CUT_EXTRUDE12_DEPTH, mode=Mode.SUBTRACT)


solid = part.part
